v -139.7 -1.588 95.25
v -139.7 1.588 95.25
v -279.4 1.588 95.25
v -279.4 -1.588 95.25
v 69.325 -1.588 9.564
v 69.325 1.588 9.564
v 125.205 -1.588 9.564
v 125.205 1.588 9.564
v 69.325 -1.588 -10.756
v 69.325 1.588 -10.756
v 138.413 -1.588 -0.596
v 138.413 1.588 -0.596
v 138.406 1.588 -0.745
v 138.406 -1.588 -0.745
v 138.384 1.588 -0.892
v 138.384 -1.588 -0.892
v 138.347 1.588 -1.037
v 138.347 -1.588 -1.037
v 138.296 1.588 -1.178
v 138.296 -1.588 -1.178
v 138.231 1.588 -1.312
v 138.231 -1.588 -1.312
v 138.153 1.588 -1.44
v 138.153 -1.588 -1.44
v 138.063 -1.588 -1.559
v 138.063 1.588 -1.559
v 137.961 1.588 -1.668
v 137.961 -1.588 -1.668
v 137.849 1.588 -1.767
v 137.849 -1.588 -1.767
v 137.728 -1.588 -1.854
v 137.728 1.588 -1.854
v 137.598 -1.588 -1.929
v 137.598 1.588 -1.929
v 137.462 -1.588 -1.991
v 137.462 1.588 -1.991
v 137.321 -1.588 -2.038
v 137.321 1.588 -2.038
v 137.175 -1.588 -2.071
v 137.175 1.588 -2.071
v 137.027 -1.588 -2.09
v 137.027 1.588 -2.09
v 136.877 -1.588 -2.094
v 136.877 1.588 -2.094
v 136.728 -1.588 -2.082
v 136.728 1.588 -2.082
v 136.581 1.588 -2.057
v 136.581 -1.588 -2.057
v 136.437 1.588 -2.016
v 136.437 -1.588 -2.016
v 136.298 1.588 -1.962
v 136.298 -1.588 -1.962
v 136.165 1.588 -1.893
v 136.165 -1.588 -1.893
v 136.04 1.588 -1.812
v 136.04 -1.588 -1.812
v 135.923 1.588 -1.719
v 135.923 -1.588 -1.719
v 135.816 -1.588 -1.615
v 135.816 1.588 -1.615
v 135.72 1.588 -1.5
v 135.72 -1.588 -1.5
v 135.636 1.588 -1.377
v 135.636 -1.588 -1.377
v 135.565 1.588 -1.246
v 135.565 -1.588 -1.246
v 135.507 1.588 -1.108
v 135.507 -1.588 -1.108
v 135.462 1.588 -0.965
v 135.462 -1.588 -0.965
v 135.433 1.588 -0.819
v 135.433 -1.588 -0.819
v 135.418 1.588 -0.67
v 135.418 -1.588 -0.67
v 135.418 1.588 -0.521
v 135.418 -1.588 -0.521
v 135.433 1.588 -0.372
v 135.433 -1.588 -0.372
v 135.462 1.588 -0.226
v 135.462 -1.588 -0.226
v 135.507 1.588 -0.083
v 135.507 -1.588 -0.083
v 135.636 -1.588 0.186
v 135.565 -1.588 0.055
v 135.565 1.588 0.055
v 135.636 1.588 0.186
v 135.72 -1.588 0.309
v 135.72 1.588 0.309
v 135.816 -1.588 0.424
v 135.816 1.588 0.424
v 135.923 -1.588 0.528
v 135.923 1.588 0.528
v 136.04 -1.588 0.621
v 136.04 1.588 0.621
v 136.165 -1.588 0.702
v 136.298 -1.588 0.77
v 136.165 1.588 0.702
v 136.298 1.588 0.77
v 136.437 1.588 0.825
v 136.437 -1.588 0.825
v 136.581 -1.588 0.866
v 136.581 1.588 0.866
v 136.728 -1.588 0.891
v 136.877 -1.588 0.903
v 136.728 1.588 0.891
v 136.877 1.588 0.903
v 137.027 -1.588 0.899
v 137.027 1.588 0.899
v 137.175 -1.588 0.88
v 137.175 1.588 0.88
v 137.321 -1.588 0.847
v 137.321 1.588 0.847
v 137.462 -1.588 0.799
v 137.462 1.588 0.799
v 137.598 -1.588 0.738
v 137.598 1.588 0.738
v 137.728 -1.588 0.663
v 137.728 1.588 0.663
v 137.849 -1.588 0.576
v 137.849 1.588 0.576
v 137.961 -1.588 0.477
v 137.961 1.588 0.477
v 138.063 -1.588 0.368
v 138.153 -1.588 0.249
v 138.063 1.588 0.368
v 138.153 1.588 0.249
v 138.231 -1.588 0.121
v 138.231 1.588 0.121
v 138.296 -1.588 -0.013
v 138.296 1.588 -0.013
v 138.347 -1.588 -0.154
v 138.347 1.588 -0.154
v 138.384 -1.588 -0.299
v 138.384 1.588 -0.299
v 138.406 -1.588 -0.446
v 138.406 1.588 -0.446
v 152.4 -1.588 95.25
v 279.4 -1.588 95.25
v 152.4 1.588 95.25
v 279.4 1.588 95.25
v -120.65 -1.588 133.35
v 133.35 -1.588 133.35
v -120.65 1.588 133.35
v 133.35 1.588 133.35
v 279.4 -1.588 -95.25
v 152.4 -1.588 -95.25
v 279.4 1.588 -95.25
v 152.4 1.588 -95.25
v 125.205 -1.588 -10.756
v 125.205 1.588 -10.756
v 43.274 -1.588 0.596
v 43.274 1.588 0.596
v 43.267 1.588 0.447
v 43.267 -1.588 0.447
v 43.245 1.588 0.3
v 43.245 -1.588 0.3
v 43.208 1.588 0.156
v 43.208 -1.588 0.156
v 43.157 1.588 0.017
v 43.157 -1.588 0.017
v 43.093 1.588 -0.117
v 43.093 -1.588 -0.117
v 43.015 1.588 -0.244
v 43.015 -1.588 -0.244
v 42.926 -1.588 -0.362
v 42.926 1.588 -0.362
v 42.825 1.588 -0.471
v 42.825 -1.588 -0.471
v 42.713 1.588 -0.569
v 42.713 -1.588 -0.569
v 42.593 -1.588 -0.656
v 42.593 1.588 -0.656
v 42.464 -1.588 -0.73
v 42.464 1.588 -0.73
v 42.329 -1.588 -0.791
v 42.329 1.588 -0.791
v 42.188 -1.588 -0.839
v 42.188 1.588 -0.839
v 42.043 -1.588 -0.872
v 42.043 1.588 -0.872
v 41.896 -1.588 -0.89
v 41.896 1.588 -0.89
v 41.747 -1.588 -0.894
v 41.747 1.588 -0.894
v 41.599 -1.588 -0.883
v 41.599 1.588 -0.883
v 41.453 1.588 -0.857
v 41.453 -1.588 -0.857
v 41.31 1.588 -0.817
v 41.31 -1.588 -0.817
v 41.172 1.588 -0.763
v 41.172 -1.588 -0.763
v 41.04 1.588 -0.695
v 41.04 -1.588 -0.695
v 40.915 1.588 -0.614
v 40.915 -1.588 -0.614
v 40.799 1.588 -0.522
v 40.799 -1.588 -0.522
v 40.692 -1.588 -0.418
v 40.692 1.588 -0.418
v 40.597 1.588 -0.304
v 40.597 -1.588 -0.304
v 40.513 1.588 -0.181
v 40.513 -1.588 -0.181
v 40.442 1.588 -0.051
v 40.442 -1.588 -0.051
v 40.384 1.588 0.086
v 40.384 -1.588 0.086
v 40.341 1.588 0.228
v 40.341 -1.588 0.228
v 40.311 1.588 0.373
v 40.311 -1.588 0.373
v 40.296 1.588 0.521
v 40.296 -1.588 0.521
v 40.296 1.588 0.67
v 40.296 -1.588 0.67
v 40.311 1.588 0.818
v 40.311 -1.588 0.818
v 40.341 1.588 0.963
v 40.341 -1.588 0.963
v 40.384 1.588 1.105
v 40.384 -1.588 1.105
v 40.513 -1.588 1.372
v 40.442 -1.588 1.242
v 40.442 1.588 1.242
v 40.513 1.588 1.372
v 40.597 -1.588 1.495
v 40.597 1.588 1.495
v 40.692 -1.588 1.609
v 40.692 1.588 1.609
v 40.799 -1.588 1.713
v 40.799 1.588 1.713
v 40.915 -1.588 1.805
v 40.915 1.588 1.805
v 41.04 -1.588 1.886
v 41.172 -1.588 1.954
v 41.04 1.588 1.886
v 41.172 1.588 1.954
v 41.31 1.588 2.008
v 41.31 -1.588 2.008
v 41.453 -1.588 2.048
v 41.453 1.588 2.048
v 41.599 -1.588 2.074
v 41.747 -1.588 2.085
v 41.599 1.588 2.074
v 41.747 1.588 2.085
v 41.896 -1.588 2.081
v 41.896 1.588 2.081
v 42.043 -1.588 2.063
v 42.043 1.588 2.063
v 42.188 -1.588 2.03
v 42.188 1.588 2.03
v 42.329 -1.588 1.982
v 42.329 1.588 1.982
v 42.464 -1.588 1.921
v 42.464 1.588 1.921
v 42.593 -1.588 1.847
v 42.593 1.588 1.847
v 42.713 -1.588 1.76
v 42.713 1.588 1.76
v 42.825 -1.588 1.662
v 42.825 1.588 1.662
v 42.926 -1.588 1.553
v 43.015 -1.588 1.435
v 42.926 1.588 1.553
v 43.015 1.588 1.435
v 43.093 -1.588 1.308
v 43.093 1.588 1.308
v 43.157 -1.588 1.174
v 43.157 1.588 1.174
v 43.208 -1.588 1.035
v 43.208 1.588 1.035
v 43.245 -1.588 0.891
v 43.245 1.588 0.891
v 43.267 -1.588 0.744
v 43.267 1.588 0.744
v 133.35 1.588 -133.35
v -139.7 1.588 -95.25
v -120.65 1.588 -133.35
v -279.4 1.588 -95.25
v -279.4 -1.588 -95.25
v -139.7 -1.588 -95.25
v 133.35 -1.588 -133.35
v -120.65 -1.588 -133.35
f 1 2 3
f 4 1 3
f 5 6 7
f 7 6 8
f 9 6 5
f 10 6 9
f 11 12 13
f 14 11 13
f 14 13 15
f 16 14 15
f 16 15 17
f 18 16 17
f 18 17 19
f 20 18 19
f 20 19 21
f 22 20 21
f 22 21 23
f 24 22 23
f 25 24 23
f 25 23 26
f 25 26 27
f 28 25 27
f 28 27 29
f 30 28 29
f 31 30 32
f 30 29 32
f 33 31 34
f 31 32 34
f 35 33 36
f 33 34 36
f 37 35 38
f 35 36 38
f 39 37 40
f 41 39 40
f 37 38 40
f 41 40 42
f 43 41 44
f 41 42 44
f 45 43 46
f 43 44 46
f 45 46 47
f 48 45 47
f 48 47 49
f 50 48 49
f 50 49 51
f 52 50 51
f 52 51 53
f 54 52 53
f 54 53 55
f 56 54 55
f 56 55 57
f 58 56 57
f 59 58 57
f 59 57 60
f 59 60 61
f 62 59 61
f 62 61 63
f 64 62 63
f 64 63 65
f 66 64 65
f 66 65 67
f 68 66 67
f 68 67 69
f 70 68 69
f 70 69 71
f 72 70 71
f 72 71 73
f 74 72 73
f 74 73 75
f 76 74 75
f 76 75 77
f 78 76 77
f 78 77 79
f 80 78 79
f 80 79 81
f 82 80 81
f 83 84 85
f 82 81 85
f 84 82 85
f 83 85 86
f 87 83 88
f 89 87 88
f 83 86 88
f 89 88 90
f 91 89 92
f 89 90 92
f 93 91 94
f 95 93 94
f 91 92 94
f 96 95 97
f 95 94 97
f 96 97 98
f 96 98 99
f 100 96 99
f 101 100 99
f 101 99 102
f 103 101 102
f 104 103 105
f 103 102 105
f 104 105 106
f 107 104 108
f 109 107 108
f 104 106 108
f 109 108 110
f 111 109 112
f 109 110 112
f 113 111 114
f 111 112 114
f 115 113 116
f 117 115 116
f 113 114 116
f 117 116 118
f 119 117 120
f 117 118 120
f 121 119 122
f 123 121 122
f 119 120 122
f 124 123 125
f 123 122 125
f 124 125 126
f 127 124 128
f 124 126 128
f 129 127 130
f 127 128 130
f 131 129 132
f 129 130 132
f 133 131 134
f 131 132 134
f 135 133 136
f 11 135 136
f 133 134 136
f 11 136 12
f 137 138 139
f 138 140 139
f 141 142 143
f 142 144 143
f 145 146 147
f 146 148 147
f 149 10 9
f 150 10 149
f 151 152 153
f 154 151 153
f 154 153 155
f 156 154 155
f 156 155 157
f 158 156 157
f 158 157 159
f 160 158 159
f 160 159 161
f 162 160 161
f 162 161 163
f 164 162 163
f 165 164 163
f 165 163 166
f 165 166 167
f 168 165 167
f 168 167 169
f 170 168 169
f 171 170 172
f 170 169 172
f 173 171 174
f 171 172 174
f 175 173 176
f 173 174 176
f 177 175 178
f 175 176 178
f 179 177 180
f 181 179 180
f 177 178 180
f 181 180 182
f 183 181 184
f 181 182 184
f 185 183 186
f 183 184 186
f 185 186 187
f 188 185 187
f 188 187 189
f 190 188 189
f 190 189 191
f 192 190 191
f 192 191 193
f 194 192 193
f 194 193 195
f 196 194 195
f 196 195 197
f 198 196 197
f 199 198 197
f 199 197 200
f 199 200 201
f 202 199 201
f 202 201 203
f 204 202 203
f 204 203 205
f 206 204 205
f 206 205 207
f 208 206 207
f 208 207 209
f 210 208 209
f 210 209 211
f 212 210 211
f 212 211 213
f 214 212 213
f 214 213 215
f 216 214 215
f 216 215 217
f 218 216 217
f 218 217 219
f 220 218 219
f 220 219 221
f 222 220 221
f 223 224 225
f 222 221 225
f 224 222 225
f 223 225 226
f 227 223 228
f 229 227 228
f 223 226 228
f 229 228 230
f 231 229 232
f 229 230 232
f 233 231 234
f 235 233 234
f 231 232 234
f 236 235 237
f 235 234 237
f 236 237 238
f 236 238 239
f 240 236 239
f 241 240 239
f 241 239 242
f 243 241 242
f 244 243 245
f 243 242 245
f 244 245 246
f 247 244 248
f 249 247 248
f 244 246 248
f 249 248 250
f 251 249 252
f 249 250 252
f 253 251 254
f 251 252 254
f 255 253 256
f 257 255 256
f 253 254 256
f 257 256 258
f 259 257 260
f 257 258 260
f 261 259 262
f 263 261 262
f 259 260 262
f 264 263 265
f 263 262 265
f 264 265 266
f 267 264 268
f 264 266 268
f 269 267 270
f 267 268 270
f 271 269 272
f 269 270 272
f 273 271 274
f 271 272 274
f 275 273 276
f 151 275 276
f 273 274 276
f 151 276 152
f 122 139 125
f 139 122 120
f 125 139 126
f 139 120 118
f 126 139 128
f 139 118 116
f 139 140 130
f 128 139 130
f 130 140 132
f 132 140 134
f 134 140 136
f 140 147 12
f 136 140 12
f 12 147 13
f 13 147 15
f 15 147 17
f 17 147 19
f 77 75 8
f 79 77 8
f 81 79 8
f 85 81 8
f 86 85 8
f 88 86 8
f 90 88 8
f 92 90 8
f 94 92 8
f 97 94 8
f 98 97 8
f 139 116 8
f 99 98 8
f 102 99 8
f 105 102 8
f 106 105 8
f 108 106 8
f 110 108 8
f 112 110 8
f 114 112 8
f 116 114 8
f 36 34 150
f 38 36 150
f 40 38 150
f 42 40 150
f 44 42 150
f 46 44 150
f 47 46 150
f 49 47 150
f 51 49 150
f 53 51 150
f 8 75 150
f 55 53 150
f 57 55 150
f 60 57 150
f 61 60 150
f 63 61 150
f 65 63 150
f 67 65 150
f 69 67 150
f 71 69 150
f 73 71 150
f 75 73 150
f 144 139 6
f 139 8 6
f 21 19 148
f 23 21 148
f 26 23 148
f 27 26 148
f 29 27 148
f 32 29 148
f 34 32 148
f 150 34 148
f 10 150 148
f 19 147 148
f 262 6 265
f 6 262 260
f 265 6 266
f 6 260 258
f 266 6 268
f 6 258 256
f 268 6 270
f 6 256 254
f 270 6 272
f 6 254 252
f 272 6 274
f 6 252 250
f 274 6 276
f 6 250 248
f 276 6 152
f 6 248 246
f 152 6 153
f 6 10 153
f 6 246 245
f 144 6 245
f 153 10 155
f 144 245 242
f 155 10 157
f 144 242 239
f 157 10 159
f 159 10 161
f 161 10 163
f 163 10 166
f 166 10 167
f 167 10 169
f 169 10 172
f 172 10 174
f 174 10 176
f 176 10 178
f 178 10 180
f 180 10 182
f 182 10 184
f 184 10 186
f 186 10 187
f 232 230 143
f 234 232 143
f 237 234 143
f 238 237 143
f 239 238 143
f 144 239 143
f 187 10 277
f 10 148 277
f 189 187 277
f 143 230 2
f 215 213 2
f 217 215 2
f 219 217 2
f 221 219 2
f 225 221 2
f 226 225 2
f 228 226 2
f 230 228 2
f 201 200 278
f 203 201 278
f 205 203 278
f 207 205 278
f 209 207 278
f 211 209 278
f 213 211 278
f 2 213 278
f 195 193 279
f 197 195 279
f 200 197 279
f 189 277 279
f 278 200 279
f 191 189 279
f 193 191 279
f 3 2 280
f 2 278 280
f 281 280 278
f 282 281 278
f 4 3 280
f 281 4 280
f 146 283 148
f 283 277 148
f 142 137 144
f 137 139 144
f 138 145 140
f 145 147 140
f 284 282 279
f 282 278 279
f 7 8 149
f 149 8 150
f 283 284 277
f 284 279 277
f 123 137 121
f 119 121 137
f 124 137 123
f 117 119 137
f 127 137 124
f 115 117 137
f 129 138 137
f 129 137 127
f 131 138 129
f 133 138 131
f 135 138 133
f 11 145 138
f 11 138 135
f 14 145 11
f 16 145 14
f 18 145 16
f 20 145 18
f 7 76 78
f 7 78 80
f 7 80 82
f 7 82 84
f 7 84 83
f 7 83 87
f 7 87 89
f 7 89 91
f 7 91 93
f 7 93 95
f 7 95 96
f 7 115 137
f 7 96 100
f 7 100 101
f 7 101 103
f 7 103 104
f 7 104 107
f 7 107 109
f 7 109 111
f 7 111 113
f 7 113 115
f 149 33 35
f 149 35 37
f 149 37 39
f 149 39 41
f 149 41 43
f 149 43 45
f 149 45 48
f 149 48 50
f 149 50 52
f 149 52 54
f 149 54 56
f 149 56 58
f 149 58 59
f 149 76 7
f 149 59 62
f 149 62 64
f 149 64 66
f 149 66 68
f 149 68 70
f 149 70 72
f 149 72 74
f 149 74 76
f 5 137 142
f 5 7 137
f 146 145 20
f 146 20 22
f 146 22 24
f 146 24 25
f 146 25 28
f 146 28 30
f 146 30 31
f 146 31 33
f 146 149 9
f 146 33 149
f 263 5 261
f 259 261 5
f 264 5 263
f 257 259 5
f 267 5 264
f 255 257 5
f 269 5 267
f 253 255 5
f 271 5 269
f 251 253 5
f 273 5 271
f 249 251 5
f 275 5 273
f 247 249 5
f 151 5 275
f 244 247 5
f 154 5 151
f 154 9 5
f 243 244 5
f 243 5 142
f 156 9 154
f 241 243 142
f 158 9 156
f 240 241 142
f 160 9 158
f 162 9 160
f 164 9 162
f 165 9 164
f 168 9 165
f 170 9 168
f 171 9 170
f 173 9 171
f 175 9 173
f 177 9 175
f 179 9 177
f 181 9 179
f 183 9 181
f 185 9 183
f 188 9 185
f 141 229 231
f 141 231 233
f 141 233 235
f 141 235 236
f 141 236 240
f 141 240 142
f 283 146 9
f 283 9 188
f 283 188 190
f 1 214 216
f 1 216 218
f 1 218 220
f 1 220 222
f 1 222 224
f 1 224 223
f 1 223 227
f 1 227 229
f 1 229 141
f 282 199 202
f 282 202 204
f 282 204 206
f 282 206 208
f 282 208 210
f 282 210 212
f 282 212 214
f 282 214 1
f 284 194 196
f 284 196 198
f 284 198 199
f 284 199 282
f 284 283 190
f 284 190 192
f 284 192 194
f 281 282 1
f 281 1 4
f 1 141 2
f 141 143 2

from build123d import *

# Parameters (mm, degrees)
BOSS_EXTRUDE1_DEPTH = 1.5875
SKETCH8_R           = 1.4986
SKETCH8_R_2         = 1.489912236
SKETCH8_W           = 55.88
SKETCH8_H           = 20.32
CUT_EXTRUDE1_DEPTH  = 20.32


with BuildPart() as part:
    # Sketch3 → Boss-Extrude1 (new body, symmetric)
    with BuildSketch(Plane(origin=(0, 0, 0), x_dir=(1, 0, 0), z_dir=(0, 1, 0))):
        Polygon((-279.4, 95.25), (-139.7, 95.25), (-120.65, 133.35), (133.35, 133.35), (152.4, 95.25), (279.4, 95.25), (279.4, -95.25), (152.4, -95.25), (133.35, -133.35), (-120.65, -133.35), (-139.7, -95.25), (-279.4, -95.25), align=None)
    extrude(amount=BOSS_EXTRUDE1_DEPTH, both=True)

    # Sketch8 → Cut-Extrude1 (cut)
    with BuildSketch(Plane(origin=(0, 1.5875, 0), x_dir=(1, 0, 0), z_dir=(0, 1, 0))):
        with Locations((136.914734299, 0.595522161)):
            Circle(SKETCH8_R)
        with Locations((41.78446907, -0.595522161)):
            Circle(SKETCH8_R_2)
        with Locations((97.265334299, 0.595522161)):
            Rectangle(SKETCH8_W, SKETCH8_H)
    extrude(amount=-CUT_EXTRUDE1_DEPTH, mode=Mode.SUBTRACT)


solid = part.part
